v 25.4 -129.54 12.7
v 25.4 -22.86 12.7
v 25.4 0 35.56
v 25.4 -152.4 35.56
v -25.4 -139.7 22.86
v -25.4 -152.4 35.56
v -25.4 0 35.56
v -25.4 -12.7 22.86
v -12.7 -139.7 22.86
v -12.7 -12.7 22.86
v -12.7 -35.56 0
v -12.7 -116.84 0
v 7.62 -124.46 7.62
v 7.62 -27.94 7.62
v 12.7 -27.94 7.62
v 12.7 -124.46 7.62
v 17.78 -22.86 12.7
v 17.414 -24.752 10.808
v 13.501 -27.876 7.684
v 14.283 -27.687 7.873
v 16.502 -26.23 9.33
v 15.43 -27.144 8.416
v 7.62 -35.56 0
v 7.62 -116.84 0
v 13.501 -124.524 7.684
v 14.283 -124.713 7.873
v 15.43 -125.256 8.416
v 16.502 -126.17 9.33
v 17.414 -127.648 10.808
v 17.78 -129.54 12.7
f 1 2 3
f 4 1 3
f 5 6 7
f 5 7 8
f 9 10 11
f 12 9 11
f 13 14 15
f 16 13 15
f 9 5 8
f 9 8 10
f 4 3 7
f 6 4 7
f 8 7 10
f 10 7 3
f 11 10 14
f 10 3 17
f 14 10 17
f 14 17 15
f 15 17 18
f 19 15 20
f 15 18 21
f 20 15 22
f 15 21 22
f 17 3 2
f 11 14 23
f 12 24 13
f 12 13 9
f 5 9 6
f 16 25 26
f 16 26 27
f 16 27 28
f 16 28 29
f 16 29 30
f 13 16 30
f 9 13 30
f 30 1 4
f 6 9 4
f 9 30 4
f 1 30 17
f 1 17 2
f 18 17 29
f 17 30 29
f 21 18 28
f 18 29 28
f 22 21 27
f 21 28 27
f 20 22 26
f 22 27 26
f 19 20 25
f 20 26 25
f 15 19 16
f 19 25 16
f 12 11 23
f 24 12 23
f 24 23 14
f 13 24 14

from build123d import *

# Parameters (mm, degrees)
F1_DEPTH = 152.4
F3_DEPTH = 50.8
F5_DEPTH = 50.8
F6_R     = 5.07999


# Not quite as in the source:
# - a fillet or chamfer is up to 0.001 mm smaller than in the source, because OpenCascade refuses the exact size


with BuildPart() as f1:
    # F0 (on Front) → F1 (new body)
    with BuildSketch(Plane.XZ):
        Polygon((25.4, 35.56), (-25.4, 35.56), (-25.4, 22.86), (-12.7, 22.86), (-12.7, 0), (0, 0), (7.62, 0), (7.62, 7.62), (17.78, 7.62), (17.78, 12.7), (25.4, 12.7), align=None)
    extrude(amount=F1_DEPTH)

    # F2 (on face) → F3 (cut)
    with BuildSketch(Plane.YZ.offset(25.4)):
        Polygon((-116.84, 0), (-152.4, 35.56), (-152.4, 0), align=None)
    extrude(amount=-F3_DEPTH, mode=Mode.SUBTRACT)

    # F4 (on face) → F5 (cut)
    with BuildSketch(Plane.YZ.offset(25.4)):
        Polygon((0, 0), (0, 35.56), (-35.56, 0), align=None)
    extrude(amount=-F5_DEPTH, mode=Mode.SUBTRACT)

    # F6 (radius 5.08 in the source; OpenCascade refuses exactly that, so slightly less here)
    f6_edges = [f1.edges().sort_by_distance(p)[0] for p in [
        (17.78, -76.2, 7.62),
    ]]
    fillet(f6_edges, radius=F6_R)


solid = f1.part
